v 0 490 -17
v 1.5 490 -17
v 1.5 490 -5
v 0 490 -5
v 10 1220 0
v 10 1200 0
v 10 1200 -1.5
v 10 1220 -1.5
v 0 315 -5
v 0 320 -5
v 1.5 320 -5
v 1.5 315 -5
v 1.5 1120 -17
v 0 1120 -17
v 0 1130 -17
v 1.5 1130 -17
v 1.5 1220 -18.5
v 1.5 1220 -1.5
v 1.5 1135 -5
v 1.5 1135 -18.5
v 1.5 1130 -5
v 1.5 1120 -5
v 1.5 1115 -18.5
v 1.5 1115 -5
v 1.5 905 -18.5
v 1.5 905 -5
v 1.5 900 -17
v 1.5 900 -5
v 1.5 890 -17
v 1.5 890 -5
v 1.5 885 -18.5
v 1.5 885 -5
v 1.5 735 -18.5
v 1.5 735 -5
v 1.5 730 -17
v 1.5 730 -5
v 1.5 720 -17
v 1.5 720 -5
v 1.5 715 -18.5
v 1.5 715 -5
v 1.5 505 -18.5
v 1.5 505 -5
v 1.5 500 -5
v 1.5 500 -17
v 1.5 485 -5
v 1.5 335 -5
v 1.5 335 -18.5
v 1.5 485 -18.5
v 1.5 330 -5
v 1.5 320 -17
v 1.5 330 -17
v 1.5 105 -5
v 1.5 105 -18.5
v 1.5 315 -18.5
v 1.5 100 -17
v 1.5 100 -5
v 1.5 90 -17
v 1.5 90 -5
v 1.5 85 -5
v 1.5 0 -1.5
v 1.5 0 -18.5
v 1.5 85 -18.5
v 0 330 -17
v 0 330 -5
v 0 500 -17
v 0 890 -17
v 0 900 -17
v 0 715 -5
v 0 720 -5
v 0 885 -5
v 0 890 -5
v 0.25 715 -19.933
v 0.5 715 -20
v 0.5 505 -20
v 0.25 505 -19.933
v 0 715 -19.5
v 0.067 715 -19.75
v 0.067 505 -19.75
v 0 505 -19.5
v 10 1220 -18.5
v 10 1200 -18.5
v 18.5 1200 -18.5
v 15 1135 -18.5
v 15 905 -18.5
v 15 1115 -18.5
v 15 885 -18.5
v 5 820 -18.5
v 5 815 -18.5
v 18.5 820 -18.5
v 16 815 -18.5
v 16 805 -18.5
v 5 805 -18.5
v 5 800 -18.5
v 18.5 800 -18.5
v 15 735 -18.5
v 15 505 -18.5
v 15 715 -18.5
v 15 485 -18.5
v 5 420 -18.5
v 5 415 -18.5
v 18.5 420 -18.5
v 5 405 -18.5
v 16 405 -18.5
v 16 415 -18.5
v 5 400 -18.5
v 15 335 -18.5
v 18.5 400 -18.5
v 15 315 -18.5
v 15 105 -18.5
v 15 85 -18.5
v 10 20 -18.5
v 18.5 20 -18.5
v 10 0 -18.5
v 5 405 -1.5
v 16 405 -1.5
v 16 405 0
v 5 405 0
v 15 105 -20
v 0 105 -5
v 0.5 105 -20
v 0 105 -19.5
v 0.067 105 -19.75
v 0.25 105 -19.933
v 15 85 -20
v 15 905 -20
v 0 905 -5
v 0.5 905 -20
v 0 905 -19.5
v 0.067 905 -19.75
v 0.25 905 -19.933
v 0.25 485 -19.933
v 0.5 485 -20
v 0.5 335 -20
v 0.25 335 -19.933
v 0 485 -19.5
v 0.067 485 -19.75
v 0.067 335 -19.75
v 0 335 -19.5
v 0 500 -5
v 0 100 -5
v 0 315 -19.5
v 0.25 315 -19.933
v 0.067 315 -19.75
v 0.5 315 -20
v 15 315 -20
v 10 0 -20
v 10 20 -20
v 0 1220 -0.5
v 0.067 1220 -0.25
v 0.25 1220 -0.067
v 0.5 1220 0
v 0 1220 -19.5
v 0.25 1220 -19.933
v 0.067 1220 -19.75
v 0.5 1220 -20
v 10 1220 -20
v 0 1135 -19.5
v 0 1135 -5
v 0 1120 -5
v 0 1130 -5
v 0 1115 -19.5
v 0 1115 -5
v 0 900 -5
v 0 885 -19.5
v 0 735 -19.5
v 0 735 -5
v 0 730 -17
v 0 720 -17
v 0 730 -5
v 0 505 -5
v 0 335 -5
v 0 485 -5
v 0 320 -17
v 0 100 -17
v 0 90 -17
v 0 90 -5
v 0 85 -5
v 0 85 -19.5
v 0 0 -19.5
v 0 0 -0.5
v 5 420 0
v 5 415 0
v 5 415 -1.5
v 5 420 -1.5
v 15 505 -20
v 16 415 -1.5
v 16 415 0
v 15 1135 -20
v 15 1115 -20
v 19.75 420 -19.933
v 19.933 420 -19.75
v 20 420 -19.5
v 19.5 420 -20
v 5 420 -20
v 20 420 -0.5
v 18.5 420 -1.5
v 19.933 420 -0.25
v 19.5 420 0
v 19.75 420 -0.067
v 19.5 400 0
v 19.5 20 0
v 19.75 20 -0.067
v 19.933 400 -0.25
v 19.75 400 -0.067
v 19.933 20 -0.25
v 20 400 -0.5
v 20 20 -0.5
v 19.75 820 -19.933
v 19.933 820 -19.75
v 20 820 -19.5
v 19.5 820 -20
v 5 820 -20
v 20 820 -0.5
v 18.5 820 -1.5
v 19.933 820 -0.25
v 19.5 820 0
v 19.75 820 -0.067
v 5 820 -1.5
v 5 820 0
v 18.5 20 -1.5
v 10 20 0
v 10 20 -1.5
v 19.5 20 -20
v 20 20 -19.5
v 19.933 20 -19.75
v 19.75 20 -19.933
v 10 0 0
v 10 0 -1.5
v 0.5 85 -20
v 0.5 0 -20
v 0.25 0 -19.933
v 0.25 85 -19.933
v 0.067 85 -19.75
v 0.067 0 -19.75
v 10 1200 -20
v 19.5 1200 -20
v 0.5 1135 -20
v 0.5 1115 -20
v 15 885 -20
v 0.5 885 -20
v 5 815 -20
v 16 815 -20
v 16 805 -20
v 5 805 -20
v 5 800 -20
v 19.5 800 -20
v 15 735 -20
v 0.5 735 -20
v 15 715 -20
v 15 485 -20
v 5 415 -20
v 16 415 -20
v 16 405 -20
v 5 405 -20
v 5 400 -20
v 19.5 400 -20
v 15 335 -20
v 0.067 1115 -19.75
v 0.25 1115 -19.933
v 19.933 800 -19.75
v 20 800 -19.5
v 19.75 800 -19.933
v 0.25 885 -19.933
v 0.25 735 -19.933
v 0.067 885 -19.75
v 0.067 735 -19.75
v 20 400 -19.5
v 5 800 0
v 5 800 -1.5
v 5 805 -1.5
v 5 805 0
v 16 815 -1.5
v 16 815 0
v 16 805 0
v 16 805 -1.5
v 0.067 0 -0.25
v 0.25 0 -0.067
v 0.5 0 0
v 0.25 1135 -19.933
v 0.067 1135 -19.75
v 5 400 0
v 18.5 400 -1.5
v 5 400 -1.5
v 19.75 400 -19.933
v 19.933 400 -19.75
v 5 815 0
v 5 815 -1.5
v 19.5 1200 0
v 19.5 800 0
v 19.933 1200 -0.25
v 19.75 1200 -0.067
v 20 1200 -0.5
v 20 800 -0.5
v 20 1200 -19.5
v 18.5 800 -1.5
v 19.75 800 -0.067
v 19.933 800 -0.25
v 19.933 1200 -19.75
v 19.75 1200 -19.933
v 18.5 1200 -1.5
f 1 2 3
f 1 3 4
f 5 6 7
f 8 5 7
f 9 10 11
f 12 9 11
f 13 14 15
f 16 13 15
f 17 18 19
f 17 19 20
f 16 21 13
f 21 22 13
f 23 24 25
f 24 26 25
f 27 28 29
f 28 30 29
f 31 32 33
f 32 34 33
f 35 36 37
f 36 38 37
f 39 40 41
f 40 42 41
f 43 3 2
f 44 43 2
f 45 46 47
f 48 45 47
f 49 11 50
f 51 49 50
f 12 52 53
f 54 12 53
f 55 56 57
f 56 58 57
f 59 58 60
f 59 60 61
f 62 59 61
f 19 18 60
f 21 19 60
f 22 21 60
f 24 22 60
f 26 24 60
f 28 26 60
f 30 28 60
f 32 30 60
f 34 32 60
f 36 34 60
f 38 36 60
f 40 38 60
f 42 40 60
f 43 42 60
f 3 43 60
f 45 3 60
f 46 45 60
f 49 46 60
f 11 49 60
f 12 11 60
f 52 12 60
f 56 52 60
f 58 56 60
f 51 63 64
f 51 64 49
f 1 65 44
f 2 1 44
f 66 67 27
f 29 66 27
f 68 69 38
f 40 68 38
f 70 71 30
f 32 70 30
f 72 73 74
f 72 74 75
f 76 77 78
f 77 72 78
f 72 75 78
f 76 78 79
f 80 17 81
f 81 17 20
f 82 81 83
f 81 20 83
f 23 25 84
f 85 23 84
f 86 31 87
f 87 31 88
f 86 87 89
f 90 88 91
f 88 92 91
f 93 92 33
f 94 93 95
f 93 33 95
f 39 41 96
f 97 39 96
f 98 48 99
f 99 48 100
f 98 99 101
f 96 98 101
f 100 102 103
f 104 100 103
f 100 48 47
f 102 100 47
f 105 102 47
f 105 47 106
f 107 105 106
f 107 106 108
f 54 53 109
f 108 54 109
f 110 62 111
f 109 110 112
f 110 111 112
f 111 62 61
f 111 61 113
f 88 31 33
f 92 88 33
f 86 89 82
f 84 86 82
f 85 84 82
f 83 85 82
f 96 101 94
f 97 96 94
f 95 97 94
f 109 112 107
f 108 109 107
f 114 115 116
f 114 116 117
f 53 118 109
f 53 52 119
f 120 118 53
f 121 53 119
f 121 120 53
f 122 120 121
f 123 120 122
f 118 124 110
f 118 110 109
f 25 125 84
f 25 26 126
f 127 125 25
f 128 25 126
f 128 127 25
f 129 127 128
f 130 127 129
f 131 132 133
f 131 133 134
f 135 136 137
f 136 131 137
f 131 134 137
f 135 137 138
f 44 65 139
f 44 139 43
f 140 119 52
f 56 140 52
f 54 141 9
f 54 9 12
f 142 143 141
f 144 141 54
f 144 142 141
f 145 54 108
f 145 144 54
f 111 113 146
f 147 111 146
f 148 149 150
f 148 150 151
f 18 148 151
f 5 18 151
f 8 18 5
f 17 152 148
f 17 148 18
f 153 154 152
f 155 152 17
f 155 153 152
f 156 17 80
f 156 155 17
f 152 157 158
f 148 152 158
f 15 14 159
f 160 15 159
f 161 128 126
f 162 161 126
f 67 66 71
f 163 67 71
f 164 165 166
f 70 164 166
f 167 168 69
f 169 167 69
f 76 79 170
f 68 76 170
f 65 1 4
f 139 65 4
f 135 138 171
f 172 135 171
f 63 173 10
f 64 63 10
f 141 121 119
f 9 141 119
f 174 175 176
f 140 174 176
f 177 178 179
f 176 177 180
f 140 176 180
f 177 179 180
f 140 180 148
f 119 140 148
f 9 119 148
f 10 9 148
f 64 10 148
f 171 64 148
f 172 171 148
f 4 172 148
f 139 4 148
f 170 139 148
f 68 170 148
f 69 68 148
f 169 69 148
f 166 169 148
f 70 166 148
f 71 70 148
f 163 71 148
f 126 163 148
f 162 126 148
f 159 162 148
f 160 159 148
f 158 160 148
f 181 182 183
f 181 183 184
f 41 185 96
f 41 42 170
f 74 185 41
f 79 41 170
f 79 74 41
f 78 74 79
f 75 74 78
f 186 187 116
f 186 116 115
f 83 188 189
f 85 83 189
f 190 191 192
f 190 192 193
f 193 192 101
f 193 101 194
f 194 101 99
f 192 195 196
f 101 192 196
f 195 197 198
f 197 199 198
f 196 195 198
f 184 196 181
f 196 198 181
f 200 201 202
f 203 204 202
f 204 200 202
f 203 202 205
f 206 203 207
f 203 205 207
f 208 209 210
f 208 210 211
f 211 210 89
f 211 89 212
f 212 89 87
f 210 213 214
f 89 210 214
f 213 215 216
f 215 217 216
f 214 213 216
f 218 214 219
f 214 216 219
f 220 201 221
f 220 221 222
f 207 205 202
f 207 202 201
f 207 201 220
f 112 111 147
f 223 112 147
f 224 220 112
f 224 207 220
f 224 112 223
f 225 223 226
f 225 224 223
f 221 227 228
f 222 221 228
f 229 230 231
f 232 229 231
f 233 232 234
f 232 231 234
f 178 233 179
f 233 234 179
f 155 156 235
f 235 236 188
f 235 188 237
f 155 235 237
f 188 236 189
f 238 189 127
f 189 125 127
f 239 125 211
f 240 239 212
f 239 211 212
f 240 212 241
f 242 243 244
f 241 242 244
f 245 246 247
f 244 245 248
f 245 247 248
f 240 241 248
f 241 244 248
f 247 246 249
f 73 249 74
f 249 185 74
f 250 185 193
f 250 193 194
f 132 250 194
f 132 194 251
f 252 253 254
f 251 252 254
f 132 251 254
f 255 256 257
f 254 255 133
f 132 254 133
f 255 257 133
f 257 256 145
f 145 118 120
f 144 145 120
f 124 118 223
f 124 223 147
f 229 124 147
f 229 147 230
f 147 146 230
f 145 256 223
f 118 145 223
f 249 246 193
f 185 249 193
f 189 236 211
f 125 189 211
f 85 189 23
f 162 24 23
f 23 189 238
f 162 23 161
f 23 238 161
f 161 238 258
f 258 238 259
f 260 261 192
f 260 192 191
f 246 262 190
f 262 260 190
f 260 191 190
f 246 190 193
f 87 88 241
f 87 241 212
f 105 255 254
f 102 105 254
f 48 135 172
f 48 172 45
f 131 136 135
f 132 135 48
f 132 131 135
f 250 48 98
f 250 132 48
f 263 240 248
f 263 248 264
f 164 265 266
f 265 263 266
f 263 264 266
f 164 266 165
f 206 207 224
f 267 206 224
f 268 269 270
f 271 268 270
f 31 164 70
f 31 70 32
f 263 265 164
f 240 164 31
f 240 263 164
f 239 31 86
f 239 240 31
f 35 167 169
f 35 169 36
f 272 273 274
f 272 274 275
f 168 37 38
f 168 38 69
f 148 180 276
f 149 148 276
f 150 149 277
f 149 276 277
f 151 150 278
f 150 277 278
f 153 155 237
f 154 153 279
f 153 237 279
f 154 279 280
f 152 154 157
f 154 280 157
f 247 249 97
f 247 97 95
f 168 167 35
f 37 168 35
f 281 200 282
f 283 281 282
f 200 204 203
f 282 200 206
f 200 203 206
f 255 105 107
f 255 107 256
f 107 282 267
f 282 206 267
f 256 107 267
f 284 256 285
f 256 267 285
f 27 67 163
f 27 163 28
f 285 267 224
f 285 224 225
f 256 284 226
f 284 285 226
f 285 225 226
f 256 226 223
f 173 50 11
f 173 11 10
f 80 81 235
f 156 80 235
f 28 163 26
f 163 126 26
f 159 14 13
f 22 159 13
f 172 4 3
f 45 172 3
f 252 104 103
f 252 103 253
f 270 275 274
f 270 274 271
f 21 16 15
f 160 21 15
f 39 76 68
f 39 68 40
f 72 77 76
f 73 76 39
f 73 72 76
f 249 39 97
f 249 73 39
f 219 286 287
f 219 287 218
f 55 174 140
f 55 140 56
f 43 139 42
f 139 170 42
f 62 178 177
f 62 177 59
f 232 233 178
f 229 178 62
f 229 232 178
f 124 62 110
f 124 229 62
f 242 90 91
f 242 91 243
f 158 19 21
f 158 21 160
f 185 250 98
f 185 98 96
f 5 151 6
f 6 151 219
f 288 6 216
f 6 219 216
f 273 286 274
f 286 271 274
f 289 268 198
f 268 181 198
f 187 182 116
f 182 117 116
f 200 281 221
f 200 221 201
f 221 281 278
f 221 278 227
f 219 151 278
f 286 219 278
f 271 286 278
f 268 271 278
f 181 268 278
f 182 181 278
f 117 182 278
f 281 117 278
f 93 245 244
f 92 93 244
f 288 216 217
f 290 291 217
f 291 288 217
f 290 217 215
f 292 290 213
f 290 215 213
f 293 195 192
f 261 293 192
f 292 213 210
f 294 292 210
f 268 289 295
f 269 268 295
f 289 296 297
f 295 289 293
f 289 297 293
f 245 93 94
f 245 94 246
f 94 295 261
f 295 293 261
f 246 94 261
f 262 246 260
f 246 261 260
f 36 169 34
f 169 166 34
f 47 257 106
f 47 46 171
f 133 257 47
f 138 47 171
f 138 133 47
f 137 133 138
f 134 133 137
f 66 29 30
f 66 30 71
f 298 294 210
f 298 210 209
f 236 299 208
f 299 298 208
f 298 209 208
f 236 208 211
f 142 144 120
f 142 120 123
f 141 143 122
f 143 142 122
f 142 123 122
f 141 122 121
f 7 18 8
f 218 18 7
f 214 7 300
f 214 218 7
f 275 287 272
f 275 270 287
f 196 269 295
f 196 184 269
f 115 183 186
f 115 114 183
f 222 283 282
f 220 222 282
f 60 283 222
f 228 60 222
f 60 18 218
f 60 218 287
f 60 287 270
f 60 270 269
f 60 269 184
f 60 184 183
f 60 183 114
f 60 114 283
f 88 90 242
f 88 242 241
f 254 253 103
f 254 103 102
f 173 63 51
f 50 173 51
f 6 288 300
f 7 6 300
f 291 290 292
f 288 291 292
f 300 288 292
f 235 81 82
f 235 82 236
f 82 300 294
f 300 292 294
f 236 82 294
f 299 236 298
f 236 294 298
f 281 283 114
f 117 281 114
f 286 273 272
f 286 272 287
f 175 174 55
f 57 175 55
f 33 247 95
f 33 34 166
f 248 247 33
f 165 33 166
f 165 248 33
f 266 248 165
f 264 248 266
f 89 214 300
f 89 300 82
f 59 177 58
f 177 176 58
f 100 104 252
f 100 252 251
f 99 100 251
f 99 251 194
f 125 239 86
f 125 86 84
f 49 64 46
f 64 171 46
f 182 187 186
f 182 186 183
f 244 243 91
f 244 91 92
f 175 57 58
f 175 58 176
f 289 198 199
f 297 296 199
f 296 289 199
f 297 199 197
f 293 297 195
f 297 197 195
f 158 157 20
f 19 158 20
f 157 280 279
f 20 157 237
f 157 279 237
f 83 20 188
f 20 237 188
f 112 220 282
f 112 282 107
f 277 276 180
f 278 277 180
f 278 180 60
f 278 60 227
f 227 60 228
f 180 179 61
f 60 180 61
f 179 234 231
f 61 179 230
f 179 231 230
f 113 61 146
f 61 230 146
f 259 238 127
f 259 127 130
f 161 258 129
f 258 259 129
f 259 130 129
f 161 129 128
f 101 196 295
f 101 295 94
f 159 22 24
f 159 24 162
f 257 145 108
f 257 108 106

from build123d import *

# Parameters (mm, degrees)
SKETCH1_W                   = 17
SKETCH1_H                   = 17
BOSS_EXTRUDE1_DEPTH         = 1220
SKETCH2_W                   = 20
SKETCH2_H                   = 20
CUT_EXTRUDE1_DEPTH          = 10
CUT_EXTRUDE2_DEPTH          = 15
SKETCH4_W                   = 3
SKETCH4_H                   = 10
CUT_EXTRUDE3_DEPTH          = 10
SKETCH_PATTERN1_START       = -20
SKETCH_PATTERN1_DEPTH       = 15
SKETCH_PATTERN1_2_OUTLINE_W = 1.5
SKETCH_PATTERN1_2_OUTLINE_H = 10
SKETCH_PATTERN1_2_DEPTH     = 3
SKETCH6_W                   = 20
SKETCH6_H                   = 20
CUT_EXTRUDE4_DEPTH          = 4
SKETCH7_W                   = 11
SKETCH7_H                   = 5
CUT_EXTRUDE5_DEPTH          = 1221.327824808
LPATTERN1_COUNT             = 2
LPATTERN1_PITCH             = 400


# Read off the part's stored shape, not the designer's step: Sketch-Pattern1
with BuildPart() as part:
    # Sketch1 → Boss-Extrude1 (new body)
    with BuildSketch(Plane(origin=(0, 0, 0), x_dir=(1, 0, 0), z_dir=(0, 1, 0))):
        with BuildLine():
            Line((0.5, 0), (19.5, 0))
            ThreePointArc((19.5, 0), (19.853553391, 0.146446609), (20, 0.5))
            Line((20, 0.5), (20, 19.5))
            ThreePointArc((20, 19.5), (19.853553391, 19.853553391), (19.5, 20))
            Line((19.5, 20), (0.5, 20))
            ThreePointArc((0.5, 20), (0.146446609, 19.853553391), (0, 19.5))
            Line((0, 19.5), (0, 0.5))
            ThreePointArc((0, 0.5), (0.146446609, 0.146446609), (0.5, 0))
        make_face()
        with Locations((10, 10)):
            Rectangle(SKETCH1_W, SKETCH1_H, mode=Mode.SUBTRACT)
    extrude(amount=BOSS_EXTRUDE1_DEPTH)

    # Sketch2 → Cut-Extrude1 (cut)
    with BuildSketch(Plane(origin=(20, 0, 0), x_dir=(0, 0, -1), z_dir=(1, 0, 0))):
        with Locations((10, 1210)):
            Rectangle(SKETCH2_W, SKETCH2_H)
        with Locations((10, 10)):
            Rectangle(SKETCH2_W, SKETCH2_H)
    extrude(amount=-CUT_EXTRUDE1_DEPTH, mode=Mode.SUBTRACT)

    # Sketch3 → Cut-Extrude2 (cut)
    with BuildSketch(Plane(origin=(0, 0, -20), x_dir=(-1, 0, 0), z_dir=(0, 0, -1))):
        Polygon((-15, 1115), (0, 1115), (0, 1120), (-9, 1120), (-9, 1130), (0, 1130), (0, 1135), (-15, 1135), align=None)
    extrude(amount=-CUT_EXTRUDE2_DEPTH, mode=Mode.SUBTRACT)

    # Sketch4 → Cut-Extrude3 (cut)
    with BuildSketch(Plane.ZY):
        with Locations((-18.5, 1125)):
            Rectangle(SKETCH4_W, SKETCH4_H)
    extrude(amount=-CUT_EXTRUDE3_DEPTH, mode=Mode.SUBTRACT)

    # Sketch-Pattern1 outline → Sketch-Pattern1 (cut)
    with BuildSketch(Plane.XY.offset(SKETCH_PATTERN1_START)):
        Polygon((15, 85), (15, 105), (0, 105), (0, 100), (1.5, 100), (1.5, 90), (0, 90), (0, 85), align=None)
        Polygon((1.5, 330), (1.5, 320), (0, 320), (0, 315), (15, 315), (15, 335), (0, 335), (0, 330), align=None)
        Polygon((1.5, 500), (1.5, 490), (0, 490), (0, 485), (15, 485), (15, 505), (0, 505), (0, 500), align=None)
        Polygon((1.5, 730), (1.5, 720), (0, 720), (0, 715), (15, 715), (15, 735), (0, 735), (0, 730), align=None)
        Polygon((1.5, 900), (1.5, 890), (0, 890), (0, 885), (15, 885), (15, 905), (0, 905), (0, 900), align=None)
    extrude(amount=SKETCH_PATTERN1_DEPTH, mode=Mode.SUBTRACT)

    # Sketch-Pattern1 2 outline → Sketch-Pattern1 2 (cut)
    with BuildSketch(Plane.XY.offset(SKETCH_PATTERN1_START)):
        with Locations((0.75, 95)):
            Rectangle(SKETCH_PATTERN1_2_OUTLINE_W, SKETCH_PATTERN1_2_OUTLINE_H)
        with Locations((0.75, 325)):
            Rectangle(SKETCH_PATTERN1_2_OUTLINE_W, SKETCH_PATTERN1_2_OUTLINE_H)
        with Locations((0.75, 495)):
            Rectangle(SKETCH_PATTERN1_2_OUTLINE_W, SKETCH_PATTERN1_2_OUTLINE_H)
        with Locations((0.75, 725)):
            Rectangle(SKETCH_PATTERN1_2_OUTLINE_W, SKETCH_PATTERN1_2_OUTLINE_H)
        with Locations((0.75, 895)):
            Rectangle(SKETCH_PATTERN1_2_OUTLINE_W, SKETCH_PATTERN1_2_OUTLINE_H)
    extrude(amount=SKETCH_PATTERN1_2_DEPTH, mode=Mode.SUBTRACT)

    # Sketch6 → Cut-Extrude4 (cut)
    with BuildSketch(Plane(origin=(20, 0, 0), x_dir=(0, 0, -1), z_dir=(1, 0, 0))):
        with Locations((10, 810)):
            Rectangle(SKETCH6_W, SKETCH6_H)
    cut_extrude4 = extrude(amount=-CUT_EXTRUDE4_DEPTH, mode=Mode.SUBTRACT)

    # Sketch7 → Cut-Extrude5 (cut, symmetric)
    with BuildSketch(Plane(origin=(0, 0, -20), x_dir=(-1, 0, 0), z_dir=(0, 0, -1))):
        with Locations((-10.5, 817.5)):
            Rectangle(SKETCH7_W, SKETCH7_H)
        with Locations((-10.5, 802.5)):
            Rectangle(SKETCH7_W, SKETCH7_H)
    cut_extrude5 = extrude(amount=CUT_EXTRUDE5_DEPTH, both=True, mode=Mode.SUBTRACT)

    # LPattern1: Cut-Extrude4, Cut-Extrude5 ×2
    with Locations(*[(0, -i * LPATTERN1_PITCH, 0) for i in range(1, LPATTERN1_COUNT)]):
        add(cut_extrude4, mode=Mode.SUBTRACT)
        add(cut_extrude5, mode=Mode.SUBTRACT)


solid = part.part
